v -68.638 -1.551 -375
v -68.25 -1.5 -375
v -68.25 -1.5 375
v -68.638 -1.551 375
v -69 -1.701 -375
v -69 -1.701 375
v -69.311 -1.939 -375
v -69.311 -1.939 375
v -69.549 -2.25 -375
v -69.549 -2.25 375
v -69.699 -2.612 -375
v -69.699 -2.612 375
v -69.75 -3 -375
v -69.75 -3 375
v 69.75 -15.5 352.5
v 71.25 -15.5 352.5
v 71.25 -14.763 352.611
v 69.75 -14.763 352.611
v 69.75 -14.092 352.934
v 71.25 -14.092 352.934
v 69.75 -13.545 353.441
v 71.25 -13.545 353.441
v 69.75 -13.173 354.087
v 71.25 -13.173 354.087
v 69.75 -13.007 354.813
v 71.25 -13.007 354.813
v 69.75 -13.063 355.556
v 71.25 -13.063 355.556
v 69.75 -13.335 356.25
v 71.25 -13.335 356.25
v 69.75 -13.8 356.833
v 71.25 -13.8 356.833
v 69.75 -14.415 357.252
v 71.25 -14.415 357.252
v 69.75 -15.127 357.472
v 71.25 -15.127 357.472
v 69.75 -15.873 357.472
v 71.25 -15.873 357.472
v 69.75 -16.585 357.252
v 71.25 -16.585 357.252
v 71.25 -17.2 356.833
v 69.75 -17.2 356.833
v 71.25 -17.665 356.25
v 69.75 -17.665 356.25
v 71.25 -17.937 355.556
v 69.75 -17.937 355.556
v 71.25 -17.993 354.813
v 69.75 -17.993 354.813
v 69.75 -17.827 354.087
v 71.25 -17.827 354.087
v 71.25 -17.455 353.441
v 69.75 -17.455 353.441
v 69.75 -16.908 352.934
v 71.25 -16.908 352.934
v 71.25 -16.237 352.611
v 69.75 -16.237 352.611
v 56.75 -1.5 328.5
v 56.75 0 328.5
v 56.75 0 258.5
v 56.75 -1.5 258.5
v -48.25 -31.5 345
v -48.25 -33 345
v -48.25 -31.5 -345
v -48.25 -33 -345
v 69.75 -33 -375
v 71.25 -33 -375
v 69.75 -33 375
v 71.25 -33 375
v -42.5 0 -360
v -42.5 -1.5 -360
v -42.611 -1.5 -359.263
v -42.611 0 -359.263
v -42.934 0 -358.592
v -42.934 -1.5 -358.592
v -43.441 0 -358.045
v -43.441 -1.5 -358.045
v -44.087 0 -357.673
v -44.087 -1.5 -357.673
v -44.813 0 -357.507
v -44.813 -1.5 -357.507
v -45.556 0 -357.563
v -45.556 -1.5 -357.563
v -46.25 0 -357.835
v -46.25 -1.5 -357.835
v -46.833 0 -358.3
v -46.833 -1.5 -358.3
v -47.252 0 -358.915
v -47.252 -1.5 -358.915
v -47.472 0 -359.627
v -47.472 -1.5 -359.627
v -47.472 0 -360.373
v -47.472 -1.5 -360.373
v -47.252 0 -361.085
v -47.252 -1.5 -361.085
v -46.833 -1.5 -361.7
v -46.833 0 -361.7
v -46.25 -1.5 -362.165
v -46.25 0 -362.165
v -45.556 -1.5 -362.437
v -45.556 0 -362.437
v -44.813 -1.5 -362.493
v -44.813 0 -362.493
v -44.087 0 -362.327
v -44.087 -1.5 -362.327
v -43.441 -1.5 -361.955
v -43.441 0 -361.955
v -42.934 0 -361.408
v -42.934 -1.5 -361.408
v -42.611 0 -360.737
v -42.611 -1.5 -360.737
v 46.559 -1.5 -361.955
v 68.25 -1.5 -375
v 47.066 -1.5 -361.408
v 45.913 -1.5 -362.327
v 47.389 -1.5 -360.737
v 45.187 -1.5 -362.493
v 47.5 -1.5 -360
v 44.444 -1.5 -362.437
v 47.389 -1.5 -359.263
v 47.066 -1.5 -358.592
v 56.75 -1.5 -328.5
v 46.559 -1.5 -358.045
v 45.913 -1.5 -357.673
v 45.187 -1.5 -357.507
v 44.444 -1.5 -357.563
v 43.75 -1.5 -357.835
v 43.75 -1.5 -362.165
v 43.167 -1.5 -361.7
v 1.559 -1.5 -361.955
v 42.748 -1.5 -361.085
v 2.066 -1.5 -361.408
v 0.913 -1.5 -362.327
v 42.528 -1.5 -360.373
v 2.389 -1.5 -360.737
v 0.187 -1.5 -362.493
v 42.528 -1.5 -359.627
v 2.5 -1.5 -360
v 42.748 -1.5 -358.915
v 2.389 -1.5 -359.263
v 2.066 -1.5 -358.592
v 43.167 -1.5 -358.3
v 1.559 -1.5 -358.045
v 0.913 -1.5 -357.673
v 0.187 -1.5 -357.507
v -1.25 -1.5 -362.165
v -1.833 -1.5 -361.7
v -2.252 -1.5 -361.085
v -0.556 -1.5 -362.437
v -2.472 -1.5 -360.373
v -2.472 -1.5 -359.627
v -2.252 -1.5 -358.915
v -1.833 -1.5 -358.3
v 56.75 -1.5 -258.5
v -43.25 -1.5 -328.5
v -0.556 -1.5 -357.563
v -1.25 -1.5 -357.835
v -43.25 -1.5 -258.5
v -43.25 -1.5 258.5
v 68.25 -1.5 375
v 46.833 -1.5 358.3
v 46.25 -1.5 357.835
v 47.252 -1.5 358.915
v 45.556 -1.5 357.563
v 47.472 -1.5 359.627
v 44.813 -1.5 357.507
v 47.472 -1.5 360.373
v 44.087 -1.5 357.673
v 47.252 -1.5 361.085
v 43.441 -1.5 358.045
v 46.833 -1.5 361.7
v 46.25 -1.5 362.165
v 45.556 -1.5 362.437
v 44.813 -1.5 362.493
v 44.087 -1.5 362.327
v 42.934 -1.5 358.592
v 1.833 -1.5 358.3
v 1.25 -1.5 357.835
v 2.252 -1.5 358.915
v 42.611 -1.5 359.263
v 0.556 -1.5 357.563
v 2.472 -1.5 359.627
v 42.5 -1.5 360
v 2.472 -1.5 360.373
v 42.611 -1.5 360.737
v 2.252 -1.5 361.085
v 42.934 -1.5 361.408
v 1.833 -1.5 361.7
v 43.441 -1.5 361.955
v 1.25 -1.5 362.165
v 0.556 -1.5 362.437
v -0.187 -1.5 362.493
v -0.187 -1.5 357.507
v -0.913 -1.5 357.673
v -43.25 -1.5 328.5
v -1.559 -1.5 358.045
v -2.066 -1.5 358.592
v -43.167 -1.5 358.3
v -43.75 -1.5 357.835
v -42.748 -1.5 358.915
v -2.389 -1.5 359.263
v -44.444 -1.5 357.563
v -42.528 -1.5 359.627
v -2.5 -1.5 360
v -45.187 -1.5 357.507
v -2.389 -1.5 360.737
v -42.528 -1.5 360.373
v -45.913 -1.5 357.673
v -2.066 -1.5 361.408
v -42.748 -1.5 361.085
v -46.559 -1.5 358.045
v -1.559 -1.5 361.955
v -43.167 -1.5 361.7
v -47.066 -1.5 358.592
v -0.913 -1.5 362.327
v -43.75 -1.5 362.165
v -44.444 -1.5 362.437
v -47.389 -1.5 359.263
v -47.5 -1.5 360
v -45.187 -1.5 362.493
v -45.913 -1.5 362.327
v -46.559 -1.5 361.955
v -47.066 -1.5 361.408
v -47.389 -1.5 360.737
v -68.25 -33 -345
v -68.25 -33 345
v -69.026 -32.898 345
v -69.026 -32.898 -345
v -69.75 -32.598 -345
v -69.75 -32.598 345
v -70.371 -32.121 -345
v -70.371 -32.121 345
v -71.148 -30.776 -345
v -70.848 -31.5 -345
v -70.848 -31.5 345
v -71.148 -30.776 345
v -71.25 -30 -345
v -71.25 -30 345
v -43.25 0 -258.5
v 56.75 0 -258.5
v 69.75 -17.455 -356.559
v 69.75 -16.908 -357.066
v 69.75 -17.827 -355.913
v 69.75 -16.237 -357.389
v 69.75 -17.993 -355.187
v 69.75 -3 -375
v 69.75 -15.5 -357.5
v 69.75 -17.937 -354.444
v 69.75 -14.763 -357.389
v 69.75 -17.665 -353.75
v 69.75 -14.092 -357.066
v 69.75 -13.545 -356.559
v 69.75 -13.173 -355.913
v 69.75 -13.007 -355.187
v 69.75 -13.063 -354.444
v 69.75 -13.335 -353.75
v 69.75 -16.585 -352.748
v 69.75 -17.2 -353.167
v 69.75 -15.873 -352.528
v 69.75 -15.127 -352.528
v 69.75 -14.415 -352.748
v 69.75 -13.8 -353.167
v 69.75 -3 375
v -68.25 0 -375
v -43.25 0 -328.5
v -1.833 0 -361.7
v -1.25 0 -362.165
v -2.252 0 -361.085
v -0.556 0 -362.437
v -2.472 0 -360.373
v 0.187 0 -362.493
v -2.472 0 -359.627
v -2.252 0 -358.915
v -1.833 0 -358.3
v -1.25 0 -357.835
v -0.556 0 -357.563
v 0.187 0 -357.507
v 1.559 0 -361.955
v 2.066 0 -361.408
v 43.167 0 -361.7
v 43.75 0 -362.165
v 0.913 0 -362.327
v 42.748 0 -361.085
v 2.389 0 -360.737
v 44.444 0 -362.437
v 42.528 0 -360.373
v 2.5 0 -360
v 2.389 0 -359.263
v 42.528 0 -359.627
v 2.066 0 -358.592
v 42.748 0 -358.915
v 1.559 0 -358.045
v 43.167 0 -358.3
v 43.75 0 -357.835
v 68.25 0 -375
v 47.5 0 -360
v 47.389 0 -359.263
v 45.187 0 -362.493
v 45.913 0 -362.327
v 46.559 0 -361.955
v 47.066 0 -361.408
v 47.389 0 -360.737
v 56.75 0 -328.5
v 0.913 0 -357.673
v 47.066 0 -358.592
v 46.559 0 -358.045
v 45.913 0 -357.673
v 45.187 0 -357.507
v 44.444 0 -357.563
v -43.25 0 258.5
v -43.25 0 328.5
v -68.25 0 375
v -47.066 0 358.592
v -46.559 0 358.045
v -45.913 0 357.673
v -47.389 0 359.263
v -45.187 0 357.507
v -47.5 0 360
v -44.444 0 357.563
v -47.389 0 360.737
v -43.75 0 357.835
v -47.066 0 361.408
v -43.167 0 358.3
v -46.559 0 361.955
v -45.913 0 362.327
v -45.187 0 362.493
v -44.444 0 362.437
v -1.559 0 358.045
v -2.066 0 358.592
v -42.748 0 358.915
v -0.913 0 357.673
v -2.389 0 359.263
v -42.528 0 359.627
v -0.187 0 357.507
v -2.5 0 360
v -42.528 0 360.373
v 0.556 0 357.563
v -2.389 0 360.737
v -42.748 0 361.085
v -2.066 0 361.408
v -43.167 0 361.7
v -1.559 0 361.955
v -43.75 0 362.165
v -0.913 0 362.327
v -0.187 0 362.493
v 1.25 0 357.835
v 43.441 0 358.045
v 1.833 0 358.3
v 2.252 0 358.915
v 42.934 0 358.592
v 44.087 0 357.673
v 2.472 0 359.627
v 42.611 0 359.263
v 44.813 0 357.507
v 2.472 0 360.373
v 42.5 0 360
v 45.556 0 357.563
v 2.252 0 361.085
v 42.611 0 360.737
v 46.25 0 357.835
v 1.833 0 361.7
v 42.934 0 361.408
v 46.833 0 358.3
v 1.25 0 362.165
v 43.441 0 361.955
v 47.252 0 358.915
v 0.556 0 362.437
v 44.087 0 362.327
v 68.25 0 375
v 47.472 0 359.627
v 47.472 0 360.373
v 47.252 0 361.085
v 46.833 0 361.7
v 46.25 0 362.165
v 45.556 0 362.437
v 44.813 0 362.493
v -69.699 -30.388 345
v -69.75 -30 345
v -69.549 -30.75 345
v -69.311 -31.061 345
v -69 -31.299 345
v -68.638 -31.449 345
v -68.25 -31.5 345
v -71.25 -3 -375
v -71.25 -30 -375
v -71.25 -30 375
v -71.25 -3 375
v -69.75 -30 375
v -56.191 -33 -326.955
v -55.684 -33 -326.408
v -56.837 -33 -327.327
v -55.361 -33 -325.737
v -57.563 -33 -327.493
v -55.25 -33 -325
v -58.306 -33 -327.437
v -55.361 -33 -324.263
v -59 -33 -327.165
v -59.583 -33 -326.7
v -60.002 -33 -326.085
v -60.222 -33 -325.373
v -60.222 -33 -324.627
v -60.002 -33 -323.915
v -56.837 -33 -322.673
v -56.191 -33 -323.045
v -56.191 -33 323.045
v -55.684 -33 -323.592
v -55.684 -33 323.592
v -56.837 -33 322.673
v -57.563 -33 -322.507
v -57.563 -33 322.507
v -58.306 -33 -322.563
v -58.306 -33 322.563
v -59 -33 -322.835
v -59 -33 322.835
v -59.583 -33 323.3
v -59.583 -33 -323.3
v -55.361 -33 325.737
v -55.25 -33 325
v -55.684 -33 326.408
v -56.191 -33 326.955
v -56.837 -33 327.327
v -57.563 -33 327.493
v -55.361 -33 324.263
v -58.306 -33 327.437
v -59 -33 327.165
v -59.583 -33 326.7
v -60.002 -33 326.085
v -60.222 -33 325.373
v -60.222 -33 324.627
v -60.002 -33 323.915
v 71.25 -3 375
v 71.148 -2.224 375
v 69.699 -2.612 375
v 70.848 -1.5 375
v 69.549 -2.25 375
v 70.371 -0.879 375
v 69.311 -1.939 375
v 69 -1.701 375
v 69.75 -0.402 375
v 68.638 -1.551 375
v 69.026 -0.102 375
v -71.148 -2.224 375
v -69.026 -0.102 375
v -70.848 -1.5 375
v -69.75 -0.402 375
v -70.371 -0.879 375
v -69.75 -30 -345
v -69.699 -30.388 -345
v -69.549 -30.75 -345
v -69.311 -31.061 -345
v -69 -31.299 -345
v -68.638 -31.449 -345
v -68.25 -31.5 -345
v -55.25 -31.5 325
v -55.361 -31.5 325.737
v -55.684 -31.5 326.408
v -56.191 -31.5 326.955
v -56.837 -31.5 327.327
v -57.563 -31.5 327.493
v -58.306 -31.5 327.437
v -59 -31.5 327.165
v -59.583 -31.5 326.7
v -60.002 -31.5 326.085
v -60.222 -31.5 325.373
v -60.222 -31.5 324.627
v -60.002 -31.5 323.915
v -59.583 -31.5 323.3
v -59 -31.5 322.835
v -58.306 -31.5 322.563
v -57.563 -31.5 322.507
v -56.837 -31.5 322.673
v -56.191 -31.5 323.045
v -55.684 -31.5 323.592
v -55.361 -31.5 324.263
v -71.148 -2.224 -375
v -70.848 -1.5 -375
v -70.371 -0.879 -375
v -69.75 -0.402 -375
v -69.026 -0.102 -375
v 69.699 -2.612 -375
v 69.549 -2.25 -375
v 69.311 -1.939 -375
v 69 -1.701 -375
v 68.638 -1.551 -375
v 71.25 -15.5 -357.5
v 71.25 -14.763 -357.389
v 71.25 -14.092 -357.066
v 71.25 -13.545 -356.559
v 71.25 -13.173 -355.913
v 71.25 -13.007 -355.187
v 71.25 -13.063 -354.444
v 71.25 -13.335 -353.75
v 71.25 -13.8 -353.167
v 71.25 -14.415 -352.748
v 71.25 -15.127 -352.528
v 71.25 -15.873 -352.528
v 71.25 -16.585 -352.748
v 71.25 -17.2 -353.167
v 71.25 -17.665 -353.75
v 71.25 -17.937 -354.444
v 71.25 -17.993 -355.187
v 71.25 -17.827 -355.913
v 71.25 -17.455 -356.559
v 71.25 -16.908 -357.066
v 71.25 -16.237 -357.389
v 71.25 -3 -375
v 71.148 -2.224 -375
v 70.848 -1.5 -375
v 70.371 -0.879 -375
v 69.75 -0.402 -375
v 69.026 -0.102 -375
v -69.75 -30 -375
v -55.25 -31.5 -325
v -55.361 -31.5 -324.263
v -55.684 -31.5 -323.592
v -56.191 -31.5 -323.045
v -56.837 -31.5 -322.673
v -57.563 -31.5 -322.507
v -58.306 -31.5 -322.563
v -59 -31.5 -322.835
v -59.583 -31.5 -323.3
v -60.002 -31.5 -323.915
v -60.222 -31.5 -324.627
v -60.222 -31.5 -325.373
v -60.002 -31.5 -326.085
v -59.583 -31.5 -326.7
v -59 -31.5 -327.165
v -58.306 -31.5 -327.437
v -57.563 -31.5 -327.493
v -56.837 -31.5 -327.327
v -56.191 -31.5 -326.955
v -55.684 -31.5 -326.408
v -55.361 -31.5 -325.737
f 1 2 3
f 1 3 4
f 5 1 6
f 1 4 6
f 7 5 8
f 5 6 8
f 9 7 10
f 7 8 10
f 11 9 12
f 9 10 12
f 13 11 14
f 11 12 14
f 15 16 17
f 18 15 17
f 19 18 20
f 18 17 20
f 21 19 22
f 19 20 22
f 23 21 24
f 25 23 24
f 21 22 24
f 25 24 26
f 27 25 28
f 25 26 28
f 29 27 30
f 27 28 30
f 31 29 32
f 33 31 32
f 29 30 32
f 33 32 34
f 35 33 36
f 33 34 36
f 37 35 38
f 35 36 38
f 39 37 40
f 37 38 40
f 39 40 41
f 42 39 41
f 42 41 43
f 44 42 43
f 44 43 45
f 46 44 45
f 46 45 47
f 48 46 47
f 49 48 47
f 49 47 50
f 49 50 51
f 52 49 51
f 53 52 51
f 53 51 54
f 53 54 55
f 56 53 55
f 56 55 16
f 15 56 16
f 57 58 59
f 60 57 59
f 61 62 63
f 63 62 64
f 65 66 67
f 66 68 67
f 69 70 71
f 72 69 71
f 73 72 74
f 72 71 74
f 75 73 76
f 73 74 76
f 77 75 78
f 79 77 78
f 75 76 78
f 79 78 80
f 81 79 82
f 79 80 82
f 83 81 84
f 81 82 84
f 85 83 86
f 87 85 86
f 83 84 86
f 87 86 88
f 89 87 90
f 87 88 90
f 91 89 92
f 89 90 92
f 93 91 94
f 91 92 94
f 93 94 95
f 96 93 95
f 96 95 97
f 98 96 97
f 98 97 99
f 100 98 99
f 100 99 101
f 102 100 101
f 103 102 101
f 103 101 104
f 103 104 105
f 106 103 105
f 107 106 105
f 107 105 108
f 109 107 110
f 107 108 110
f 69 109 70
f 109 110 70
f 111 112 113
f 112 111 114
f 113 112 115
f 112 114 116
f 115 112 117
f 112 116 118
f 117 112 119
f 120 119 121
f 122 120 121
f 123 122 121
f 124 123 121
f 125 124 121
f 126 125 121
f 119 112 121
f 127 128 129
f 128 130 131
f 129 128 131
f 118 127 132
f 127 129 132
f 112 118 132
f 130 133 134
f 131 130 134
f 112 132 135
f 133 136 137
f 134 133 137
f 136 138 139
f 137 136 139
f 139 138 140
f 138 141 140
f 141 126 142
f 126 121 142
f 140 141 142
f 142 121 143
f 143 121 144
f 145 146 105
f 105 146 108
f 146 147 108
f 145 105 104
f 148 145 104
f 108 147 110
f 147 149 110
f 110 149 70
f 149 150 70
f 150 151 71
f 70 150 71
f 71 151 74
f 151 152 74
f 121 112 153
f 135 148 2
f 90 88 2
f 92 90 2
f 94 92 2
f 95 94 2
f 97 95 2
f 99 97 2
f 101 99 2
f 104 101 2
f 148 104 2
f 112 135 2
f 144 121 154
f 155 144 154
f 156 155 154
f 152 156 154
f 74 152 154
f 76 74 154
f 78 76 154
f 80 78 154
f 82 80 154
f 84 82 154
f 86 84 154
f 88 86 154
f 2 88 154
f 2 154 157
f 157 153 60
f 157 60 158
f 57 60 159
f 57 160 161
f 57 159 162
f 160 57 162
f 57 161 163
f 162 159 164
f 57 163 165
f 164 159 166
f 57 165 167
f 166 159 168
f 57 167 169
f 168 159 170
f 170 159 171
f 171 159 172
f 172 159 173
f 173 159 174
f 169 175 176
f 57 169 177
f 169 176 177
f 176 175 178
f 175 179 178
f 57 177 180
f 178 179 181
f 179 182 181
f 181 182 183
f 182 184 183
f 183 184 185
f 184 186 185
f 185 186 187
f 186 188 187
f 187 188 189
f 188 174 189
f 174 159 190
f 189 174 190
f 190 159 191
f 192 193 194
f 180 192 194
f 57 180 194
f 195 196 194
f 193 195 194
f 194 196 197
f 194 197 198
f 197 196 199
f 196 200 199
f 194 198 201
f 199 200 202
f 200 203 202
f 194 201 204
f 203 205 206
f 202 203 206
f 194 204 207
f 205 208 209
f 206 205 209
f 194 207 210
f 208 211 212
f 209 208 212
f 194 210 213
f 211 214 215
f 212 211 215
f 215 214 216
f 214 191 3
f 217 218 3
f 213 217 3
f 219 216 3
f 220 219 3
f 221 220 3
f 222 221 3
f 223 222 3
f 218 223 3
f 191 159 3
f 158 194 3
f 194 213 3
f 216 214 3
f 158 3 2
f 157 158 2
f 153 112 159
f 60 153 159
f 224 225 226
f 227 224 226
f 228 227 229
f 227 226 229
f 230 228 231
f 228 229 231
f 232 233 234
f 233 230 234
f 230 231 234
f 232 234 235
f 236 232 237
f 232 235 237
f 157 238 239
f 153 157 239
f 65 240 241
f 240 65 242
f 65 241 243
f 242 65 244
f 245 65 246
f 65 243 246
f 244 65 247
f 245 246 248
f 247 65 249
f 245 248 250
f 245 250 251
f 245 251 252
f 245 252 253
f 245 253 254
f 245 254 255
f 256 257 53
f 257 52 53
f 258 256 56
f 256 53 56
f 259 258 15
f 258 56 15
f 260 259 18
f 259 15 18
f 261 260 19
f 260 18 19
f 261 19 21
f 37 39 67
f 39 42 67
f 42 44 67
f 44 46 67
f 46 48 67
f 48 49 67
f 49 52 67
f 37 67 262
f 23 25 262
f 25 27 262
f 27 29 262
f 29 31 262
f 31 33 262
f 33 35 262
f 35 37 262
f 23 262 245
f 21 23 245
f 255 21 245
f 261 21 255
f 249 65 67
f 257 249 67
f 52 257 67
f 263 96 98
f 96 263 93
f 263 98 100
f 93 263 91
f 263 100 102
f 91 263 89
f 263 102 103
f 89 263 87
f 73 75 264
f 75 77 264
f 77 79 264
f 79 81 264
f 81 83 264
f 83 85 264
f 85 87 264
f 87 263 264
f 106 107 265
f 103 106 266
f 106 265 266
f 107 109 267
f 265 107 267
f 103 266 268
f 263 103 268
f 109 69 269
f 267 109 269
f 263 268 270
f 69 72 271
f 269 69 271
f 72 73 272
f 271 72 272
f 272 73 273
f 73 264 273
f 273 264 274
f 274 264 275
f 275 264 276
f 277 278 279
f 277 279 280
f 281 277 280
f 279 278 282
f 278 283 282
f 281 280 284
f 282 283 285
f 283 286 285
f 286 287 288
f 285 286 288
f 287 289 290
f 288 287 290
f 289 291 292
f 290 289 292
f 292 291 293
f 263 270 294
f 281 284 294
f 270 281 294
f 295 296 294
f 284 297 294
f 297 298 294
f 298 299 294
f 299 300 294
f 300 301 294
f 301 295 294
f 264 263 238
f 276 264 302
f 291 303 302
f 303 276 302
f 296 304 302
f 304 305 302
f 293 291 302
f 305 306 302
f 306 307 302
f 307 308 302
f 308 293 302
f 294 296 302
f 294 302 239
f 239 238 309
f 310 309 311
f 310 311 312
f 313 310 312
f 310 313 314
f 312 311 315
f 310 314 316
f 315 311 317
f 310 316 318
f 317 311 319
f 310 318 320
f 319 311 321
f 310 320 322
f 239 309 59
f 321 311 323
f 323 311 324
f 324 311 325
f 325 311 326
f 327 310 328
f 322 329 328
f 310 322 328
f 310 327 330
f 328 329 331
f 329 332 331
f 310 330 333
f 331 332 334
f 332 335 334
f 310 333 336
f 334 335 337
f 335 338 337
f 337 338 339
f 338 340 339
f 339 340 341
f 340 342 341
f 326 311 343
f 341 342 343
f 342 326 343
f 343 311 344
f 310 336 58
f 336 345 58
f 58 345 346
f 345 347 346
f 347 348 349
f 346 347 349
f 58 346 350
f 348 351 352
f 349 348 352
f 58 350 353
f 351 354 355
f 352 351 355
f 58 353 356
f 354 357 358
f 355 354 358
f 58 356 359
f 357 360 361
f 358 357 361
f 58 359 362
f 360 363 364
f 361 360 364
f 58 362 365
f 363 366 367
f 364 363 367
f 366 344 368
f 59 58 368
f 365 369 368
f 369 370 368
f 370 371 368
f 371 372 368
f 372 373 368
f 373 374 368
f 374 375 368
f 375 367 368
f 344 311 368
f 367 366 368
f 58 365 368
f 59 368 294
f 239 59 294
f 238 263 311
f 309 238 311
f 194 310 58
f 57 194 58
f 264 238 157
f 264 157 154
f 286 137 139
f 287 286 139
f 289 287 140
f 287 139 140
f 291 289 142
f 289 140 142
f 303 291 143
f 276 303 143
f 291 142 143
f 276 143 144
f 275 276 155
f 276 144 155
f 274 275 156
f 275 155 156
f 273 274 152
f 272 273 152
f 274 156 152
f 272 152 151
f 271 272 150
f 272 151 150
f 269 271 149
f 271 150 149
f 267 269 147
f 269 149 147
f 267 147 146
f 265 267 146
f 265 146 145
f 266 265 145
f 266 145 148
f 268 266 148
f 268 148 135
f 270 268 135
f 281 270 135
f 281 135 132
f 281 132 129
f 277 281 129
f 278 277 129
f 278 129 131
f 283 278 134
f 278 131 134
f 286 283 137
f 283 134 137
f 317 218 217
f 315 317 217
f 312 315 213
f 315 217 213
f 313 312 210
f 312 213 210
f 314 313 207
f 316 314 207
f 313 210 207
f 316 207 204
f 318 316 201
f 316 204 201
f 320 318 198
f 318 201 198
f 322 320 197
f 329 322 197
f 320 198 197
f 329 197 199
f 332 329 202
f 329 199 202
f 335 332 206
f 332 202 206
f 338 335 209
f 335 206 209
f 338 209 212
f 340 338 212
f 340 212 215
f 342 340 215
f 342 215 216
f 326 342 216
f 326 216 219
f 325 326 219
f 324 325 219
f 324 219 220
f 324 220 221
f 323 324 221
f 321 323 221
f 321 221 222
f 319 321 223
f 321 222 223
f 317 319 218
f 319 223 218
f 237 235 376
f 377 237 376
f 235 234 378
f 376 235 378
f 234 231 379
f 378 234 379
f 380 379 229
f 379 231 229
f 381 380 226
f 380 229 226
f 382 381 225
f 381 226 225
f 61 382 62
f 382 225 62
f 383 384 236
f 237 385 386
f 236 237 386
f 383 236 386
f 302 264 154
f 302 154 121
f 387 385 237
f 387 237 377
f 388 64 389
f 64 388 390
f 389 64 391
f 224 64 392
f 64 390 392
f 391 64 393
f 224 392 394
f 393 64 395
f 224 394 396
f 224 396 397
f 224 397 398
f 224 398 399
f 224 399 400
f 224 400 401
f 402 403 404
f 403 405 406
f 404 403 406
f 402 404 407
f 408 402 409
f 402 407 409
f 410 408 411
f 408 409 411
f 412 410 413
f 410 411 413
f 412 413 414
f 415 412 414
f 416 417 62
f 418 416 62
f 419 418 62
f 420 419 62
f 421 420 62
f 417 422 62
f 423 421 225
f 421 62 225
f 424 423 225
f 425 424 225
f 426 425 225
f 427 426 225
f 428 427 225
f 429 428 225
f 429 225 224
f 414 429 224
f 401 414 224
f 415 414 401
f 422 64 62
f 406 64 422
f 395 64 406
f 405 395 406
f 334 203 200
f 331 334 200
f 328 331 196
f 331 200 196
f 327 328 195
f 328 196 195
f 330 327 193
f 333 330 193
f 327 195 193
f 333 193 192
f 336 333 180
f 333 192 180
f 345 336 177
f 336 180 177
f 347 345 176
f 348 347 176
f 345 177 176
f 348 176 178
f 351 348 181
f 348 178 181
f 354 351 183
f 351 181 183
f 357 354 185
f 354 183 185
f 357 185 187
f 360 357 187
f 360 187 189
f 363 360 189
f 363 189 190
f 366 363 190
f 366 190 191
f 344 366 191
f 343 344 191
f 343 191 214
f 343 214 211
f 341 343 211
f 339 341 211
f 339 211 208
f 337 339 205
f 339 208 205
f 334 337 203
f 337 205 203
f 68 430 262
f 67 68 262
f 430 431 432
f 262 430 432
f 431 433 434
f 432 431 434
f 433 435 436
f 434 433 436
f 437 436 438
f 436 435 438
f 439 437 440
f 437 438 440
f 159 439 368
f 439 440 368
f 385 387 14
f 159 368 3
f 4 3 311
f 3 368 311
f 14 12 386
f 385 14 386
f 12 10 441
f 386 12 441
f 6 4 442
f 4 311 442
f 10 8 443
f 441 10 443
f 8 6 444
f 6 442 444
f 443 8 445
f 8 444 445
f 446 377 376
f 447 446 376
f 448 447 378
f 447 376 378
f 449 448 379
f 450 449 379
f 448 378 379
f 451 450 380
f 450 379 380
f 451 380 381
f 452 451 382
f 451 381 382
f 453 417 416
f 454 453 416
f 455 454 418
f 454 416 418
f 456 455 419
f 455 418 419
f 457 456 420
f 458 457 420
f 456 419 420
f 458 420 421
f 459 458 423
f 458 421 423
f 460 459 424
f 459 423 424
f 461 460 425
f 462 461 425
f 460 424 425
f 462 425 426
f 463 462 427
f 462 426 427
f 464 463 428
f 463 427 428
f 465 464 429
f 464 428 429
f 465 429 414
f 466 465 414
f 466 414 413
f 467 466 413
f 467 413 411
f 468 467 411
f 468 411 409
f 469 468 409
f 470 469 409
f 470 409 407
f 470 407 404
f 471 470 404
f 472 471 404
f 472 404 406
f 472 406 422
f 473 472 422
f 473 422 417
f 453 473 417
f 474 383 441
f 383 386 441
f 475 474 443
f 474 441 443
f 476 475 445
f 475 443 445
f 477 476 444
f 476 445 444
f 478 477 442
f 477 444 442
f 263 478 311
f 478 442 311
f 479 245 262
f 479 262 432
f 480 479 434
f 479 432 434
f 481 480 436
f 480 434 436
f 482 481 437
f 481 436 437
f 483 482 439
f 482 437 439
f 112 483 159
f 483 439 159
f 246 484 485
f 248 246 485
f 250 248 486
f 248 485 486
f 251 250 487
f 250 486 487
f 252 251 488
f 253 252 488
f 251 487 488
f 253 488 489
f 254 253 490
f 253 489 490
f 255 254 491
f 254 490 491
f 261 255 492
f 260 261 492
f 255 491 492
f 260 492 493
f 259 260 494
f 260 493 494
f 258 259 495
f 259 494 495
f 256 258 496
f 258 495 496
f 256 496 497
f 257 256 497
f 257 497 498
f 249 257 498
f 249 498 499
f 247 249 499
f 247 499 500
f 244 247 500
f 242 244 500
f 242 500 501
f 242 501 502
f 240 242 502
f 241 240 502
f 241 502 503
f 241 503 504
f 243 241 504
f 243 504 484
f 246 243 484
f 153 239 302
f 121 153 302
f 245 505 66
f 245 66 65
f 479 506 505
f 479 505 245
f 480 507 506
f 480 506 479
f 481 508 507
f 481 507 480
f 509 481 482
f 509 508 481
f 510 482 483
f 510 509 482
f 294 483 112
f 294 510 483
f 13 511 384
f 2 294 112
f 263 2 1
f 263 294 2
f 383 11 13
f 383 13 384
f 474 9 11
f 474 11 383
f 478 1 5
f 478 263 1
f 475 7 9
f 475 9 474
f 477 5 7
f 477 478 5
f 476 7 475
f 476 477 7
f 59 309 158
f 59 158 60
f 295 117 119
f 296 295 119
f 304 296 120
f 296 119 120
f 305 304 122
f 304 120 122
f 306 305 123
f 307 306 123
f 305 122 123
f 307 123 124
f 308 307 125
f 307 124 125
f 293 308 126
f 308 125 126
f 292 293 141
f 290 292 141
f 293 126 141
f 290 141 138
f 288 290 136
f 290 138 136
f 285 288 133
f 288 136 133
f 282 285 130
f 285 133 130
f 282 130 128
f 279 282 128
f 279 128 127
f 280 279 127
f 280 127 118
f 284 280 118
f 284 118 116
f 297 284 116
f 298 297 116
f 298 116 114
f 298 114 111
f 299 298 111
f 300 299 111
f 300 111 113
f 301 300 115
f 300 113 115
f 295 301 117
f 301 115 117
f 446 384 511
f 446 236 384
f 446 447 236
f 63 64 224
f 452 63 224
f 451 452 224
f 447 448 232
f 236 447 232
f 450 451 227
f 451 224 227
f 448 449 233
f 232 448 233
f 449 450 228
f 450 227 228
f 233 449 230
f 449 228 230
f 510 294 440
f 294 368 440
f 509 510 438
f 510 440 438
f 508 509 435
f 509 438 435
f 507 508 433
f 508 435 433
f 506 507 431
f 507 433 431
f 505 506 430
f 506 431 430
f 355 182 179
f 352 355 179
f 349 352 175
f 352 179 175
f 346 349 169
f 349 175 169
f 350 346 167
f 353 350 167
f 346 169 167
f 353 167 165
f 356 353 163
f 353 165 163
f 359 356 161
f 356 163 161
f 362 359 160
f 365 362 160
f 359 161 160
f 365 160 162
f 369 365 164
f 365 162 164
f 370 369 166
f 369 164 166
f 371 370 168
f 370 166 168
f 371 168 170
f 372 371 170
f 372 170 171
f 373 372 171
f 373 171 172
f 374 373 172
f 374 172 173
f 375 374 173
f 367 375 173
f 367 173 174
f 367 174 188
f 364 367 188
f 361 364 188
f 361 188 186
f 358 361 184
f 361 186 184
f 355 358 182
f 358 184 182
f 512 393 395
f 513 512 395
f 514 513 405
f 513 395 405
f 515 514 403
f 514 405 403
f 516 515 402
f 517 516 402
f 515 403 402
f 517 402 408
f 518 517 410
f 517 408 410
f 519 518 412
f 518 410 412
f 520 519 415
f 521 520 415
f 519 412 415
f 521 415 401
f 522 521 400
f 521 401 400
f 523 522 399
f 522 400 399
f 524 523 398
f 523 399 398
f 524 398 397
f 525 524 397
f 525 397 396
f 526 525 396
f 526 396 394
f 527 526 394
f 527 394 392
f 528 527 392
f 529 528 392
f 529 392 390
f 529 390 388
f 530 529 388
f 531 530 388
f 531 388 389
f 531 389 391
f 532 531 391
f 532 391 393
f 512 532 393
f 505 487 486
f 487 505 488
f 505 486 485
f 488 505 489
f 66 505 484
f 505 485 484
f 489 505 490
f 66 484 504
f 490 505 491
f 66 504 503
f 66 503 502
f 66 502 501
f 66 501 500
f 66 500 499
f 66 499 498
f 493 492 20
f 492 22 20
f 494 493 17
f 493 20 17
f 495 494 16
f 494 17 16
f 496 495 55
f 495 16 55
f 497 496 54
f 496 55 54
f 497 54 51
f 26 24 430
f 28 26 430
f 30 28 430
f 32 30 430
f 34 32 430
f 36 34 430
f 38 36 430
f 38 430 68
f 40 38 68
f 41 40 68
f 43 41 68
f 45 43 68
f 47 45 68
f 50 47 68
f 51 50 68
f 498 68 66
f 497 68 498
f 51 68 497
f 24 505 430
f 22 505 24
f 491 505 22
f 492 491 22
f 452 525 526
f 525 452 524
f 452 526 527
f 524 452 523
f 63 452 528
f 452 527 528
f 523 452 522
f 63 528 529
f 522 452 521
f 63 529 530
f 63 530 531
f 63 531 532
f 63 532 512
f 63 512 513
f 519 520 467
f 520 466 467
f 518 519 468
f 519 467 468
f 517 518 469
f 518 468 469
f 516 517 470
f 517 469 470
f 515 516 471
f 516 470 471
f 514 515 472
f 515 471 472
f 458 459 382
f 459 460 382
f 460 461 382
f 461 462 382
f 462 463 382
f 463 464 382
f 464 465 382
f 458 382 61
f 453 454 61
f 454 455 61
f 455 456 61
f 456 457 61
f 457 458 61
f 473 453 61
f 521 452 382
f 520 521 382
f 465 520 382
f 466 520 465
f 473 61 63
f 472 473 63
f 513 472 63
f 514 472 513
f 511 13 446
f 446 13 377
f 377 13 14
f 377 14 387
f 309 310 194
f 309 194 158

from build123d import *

# Parameters (mm, degrees)
SM_BASE_FLANGE_1_DEPTH = 375
SKETCH_6_R             = 2.5
CUT_EXTRUDE_1_DEPTH    = 10
SKETCH_7_R             = 2.5
SKETCH_7_W             = 20
SKETCH_7_H             = 30
SKETCH_7_W_2           = 3
CUT_EXTRUDE_2_DEPTH    = 3
SKETCH_8_R             = 2.5
CUT_EXTRUDE_3_DEPTH    = 1.5
SKETCH_10_W            = 100
SKETCH_10_H            = 70
CUT_EXTRUDE_5_DEPTH    = 1.5


# Sheet-metal steps are written as plain solids
with BuildPart() as part:
    # Sketch 1 → Базовая кромка1 (new, symmetric)
    with BuildSketch(Plane.XY):
        with BuildLine():
            Line((-25.25, -33), (-68.25, -33))
            ThreePointArc((-68.25, -33), (-70.371320344, -32.121320344), (-71.25, -30))
            Line((-71.25, -30), (-71.25, -3))
            ThreePointArc((-71.25, -3), (-70.371320344, -0.878679656), (-68.25, 0))
            Line((-68.25, 0), (68.25, 0))
            ThreePointArc((68.25, 0), (70.371320344, -0.878679656), (71.25, -3))
            Line((71.25, -3), (71.25, -33))
            Line((71.25, -33), (69.75, -33))
            Line((69.75, -33), (69.75, -3))
            ThreePointArc((69.75, -3), (69.310660172, -1.939339828), (68.25, -1.5))
            Line((68.25, -1.5), (-68.25, -1.5))
            ThreePointArc((-68.25, -1.5), (-69.310660172, -1.939339828), (-69.75, -3))
            Line((-69.75, -3), (-69.75, -30))
            ThreePointArc((-69.75, -30), (-69.310660172, -31.060660172), (-68.25, -31.5))
            Line((-68.25, -31.5), (-25.25, -31.5))
            Line((-25.25, -31.5), (-25.25, -33))
        make_face()
    extrude(amount=SM_BASE_FLANGE_1_DEPTH, both=True)

    # Эскиз6 → Вырез-Вытянуть1 (cut)
    with BuildSketch(Plane(origin=(71.25, 0, 0), x_dir=(0, 0, -1), z_dir=(1, 0, 0))):
        with Locations((-355, -15.5)):
            Circle(SKETCH_6_R)
        with Locations((355, -15.5)):
            Circle(SKETCH_6_R)
    extrude(amount=-CUT_EXTRUDE_1_DEPTH, mode=Mode.SUBTRACT)

    # Эскиз7 → Вырез-Вытянуть2 (cut)
    with BuildSketch(Plane.XZ.offset(33)):
        with Locations((-57.75, -325)):
            Circle(SKETCH_7_R)
        with Locations((-58.25, -360)):
            Rectangle(SKETCH_7_W, SKETCH_7_H)
        Polygon((-48.25, -375), (-25.25, -375), (-25.25, 375), (-48.25, 375), (-48.25, 345), (-48.25, -345), align=None)
        with Locations((-69.75, -360)):
            Rectangle(SKETCH_7_W_2, SKETCH_7_H)
        with Locations((-58.25, 360)):
            Rectangle(SKETCH_7_W, SKETCH_7_H)
        with Locations((-69.75, 360)):
            Rectangle(SKETCH_7_W_2, SKETCH_7_H)
        with Locations((-57.75, 325)):
            Circle(SKETCH_7_R)
    extrude(amount=-CUT_EXTRUDE_2_DEPTH, mode=Mode.SUBTRACT)

    # Эскиз8 → Вырез-Вытянуть3 (cut)
    with BuildSketch(Plane.XZ.offset(1.5)):
        with Locations((-45, -360)):
            Circle(SKETCH_8_R)
        with Locations((0, -360)):
            Circle(SKETCH_8_R)
        with Locations((45, -360)):
            Circle(SKETCH_8_R)
        with Locations(Location((45, 360, 0), (0, 0, 180))):
            Circle(SKETCH_8_R)
        with Locations(Location((0, 360, 0), (0, 0, 180))):
            Circle(SKETCH_8_R)
        with Locations(Location((-45, 360, 0), (0, 0, 180))):
            Circle(SKETCH_8_R)
    extrude(amount=-CUT_EXTRUDE_3_DEPTH, mode=Mode.SUBTRACT)

    # Эскиз10 → Вырез-Вытянуть5 (cut)
    with BuildSketch(Plane(origin=(0, 0, 0), x_dir=(1, 0, 0), z_dir=(0, 1, 0))):
        with Locations((6.75, 293.5)):
            Rectangle(SKETCH_10_W, SKETCH_10_H)
        with Locations((6.75, -293.5)):
            Rectangle(SKETCH_10_W, SKETCH_10_H)
    extrude(amount=-CUT_EXTRUDE_5_DEPTH, mode=Mode.SUBTRACT)


solid = part.part
